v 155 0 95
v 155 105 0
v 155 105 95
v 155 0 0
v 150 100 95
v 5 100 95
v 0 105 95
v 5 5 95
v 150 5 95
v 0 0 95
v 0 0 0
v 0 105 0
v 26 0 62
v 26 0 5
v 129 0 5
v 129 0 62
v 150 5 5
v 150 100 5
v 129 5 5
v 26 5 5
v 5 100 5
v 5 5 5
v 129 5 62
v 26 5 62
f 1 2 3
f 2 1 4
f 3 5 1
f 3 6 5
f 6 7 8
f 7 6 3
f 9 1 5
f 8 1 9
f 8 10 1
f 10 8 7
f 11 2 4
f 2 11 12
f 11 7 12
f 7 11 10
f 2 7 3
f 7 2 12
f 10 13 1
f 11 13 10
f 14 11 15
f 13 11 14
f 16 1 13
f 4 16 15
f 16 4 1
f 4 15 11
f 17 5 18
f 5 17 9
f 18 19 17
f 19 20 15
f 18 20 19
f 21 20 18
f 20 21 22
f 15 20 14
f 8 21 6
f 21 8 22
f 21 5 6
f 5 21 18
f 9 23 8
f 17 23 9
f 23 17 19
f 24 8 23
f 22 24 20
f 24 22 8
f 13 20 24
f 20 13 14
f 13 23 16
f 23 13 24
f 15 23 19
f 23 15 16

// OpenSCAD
// LED Display Datasheets.  Technically from 52pi.com, but close enough to Adafruit, except for some dimensions
// https://wiki.52pi.com/index.php?title=Z-0235
// https://cdn-shop.adafruit.com/datasheets/TC2004A-01.pdf
// https://52pi.com/products/52pi-2004-serial-lcd-module-display

// TODO!  UPDATE BEFORE FINAL STL.  30 seems to be good; 5 renders fast
$fn = 30;
is_center = false;

render_delta = 0.1;

case_top_x = 155; // lid length
case_top_y = 105; // lid height
case_top_z = 5; // lid_thickness
case_top_inset = 5;
case_top_thickness = 3;

case_x = case_top_x; // same as case_top_x
case_y = case_top_y; // same as case_top_y
case_z = 95; // case height
case_thickness = case_top_inset; // thickness == how far we've inset the top walls

lcd_screen_x = 97.5;
lcd_screen_y = 40;
lcd_screen_z = 9.4;

pcb_x = 98.15;
pcb_y = 60;
pcb_z = 1.6;
    
screwhole_radius = 3 / 2; // 3mm diameter
screwhole_x = 93 / 2; // distance from center of lcd_screen to screwhole
screwhole_y = 55 / 2;
screwhole_z = lcd_screen_z - case_top_z;

button_radius = 7.5 / 2; // buttons are 24mm wide

printer_hole_translate_y = 46; // ((case_top_y - (lcd_screen_y + button_radius)) / 3)*2 + 5;
button_hole_translate_y = 23.5; // ((case_top_y - (lcd_screen_y + button_radius)) / 3) + 3;

thermal_printer_base_x = 103;
thermal_printer_base_y = 57;

//case_top_all();
case();
//lcd_display();

module case() {
    difference() {
        cube([case_x, case_y, case_z], center=is_center);
        translate([case_thickness,case_thickness,case_thickness])
            cube([case_x - case_thickness*2, case_y - case_thickness*2, case_z - case_thickness], center=is_center);
        
        #translate([(case_x - thermal_printer_base_x)/2,case_thickness,5])
            rotate([90,0,0])
                cube([thermal_printer_base_x, thermal_printer_base_y, case_thickness], is_center);
    }
}

module case_top_all() {
    case_top();
    case_top_border();
    //lcd_display_embedded();
    case_top_screwholes_embedded();
}

module case_top_screwholes_embedded() {
    screwhole_translate_y_start = printer_hole_translate_y + lcd_screen_y/2;
    #translate([(case_top_x/2 - screwhole_x), screwhole_translate_y_start + screwhole_y, case_top_z])
        screwhole_barrel();
    translate([(case_top_x/2 - screwhole_x), screwhole_translate_y_start - screwhole_y, case_top_z])
        screwhole_barrel();
    translate([(case_top_x/2 + screwhole_x), screwhole_translate_y_start + screwhole_y, case_top_z])
        screwhole_barrel();
    translate([(case_top_x/2 + screwhole_x), screwhole_translate_y_start - screwhole_y, case_top_z])
        screwhole_barrel();
}    

module screwhole_barrel() {
    is_center = true;
    outer_diameter = screwhole_radius * 3;
    inner_diameter = screwhole_radius;
    translate([0,0,screwhole_z/2])
        difference() {
            cylinder(screwhole_z, r= outer_diameter, center=is_center);
            cylinder(screwhole_z, r= inner_diameter, center=is_center);
        }
}

module case_top_border() {
    thickness = 3;
    difference() {
        translate([case_top_inset, case_top_inset, case_top_z])
            cube([case_top_x - case_top_inset*2, case_top_y - case_top_inset*2, case_top_thickness]);
        translate([case_top_inset+case_top_thickness, case_top_inset+case_top_thickness, case_top_z])
            cube([case_top_x - (case_top_inset*2 + case_top_thickness*2), case_top_y - (case_top_inset*2 + case_top_thickness*2), case_top_thickness]);

    }
}


module case_top() {
    difference() {
        cube([case_top_x, case_top_y, case_top_z]);
        translate([(case_top_x - lcd_screen_x)/2, printer_hole_translate_y, 0])
            printer_hole();
        #translate([(case_top_x)/2, button_hole_translate_y, 0])
            button_hole();
    }
}

module button_hole() {
    cylinder(case_top_z*2, r= button_radius, center=true);
}

module printer_hole() {
    cube([lcd_screen_x, lcd_screen_y, case_top_z]);
}

module lcd_display_embedded() {
    rotate([180,0,0])
        translate([(case_top_x-pcb_x)/2,-pcb_y + -printer_hole_translate_y + (pcb_y - lcd_screen_y)/2, -(pcb_z + lcd_screen_z)])
            lcd_display();
}
module lcd_display() {
    is_center = true;
    translate([pcb_x/2, pcb_y/2, pcb_z/2])
        difference() {
            union() {
                cube([pcb_x, pcb_y, pcb_z], center=is_center);
                translate([0,0,(lcd_screen_z + pcb_z) / 2])
                    cube([lcd_screen_x, lcd_screen_y, lcd_screen_z], center=is_center);
            }
            translate([screwhole_x, screwhole_y, 0])
                cylinder(h=pcb_z, r=screwhole_radius, center=is_center);
            translate([-screwhole_x, screwhole_y, 0])
                cylinder(h=pcb_z, r=screwhole_radius, center=is_center);
            translate([screwhole_x, -screwhole_y, 0])
                cylinder(h=pcb_z, r=screwhole_radius, center=is_center);
            translate([-screwhole_x, -screwhole_y, 0])
                cylinder(h=pcb_z, r=screwhole_radius, center=is_center);
        }
    
}
